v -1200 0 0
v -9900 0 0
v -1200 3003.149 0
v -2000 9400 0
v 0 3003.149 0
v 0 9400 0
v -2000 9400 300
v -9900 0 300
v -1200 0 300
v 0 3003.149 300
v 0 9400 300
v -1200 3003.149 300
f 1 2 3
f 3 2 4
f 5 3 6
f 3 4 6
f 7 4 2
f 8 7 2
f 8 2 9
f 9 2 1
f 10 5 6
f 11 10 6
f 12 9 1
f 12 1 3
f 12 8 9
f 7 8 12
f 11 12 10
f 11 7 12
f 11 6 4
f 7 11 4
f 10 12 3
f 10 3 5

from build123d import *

# Parameters (mm, degrees)
F1_DEPTH = 300
F2_W     = 1200
F2_H     = 3003.149206
F3_DEPTH = 300.001


with BuildPart() as f1:
    # F0 (on Top) → F1 (new body)
    with BuildSketch(Plane.XY):
        Polygon((-9900, 0), (0, 0), (0, 9400), (-2000, 9400), align=None)
    extrude(amount=F1_DEPTH)

    # F2 (on face) → F3 (cut, through all)
    with BuildSketch(Plane.XY.offset(300)):
        with Locations((-600, 1501.574603)):
            Rectangle(F2_W, F2_H)
    extrude(amount=-F3_DEPTH, mode=Mode.SUBTRACT)


solid = f1.part
